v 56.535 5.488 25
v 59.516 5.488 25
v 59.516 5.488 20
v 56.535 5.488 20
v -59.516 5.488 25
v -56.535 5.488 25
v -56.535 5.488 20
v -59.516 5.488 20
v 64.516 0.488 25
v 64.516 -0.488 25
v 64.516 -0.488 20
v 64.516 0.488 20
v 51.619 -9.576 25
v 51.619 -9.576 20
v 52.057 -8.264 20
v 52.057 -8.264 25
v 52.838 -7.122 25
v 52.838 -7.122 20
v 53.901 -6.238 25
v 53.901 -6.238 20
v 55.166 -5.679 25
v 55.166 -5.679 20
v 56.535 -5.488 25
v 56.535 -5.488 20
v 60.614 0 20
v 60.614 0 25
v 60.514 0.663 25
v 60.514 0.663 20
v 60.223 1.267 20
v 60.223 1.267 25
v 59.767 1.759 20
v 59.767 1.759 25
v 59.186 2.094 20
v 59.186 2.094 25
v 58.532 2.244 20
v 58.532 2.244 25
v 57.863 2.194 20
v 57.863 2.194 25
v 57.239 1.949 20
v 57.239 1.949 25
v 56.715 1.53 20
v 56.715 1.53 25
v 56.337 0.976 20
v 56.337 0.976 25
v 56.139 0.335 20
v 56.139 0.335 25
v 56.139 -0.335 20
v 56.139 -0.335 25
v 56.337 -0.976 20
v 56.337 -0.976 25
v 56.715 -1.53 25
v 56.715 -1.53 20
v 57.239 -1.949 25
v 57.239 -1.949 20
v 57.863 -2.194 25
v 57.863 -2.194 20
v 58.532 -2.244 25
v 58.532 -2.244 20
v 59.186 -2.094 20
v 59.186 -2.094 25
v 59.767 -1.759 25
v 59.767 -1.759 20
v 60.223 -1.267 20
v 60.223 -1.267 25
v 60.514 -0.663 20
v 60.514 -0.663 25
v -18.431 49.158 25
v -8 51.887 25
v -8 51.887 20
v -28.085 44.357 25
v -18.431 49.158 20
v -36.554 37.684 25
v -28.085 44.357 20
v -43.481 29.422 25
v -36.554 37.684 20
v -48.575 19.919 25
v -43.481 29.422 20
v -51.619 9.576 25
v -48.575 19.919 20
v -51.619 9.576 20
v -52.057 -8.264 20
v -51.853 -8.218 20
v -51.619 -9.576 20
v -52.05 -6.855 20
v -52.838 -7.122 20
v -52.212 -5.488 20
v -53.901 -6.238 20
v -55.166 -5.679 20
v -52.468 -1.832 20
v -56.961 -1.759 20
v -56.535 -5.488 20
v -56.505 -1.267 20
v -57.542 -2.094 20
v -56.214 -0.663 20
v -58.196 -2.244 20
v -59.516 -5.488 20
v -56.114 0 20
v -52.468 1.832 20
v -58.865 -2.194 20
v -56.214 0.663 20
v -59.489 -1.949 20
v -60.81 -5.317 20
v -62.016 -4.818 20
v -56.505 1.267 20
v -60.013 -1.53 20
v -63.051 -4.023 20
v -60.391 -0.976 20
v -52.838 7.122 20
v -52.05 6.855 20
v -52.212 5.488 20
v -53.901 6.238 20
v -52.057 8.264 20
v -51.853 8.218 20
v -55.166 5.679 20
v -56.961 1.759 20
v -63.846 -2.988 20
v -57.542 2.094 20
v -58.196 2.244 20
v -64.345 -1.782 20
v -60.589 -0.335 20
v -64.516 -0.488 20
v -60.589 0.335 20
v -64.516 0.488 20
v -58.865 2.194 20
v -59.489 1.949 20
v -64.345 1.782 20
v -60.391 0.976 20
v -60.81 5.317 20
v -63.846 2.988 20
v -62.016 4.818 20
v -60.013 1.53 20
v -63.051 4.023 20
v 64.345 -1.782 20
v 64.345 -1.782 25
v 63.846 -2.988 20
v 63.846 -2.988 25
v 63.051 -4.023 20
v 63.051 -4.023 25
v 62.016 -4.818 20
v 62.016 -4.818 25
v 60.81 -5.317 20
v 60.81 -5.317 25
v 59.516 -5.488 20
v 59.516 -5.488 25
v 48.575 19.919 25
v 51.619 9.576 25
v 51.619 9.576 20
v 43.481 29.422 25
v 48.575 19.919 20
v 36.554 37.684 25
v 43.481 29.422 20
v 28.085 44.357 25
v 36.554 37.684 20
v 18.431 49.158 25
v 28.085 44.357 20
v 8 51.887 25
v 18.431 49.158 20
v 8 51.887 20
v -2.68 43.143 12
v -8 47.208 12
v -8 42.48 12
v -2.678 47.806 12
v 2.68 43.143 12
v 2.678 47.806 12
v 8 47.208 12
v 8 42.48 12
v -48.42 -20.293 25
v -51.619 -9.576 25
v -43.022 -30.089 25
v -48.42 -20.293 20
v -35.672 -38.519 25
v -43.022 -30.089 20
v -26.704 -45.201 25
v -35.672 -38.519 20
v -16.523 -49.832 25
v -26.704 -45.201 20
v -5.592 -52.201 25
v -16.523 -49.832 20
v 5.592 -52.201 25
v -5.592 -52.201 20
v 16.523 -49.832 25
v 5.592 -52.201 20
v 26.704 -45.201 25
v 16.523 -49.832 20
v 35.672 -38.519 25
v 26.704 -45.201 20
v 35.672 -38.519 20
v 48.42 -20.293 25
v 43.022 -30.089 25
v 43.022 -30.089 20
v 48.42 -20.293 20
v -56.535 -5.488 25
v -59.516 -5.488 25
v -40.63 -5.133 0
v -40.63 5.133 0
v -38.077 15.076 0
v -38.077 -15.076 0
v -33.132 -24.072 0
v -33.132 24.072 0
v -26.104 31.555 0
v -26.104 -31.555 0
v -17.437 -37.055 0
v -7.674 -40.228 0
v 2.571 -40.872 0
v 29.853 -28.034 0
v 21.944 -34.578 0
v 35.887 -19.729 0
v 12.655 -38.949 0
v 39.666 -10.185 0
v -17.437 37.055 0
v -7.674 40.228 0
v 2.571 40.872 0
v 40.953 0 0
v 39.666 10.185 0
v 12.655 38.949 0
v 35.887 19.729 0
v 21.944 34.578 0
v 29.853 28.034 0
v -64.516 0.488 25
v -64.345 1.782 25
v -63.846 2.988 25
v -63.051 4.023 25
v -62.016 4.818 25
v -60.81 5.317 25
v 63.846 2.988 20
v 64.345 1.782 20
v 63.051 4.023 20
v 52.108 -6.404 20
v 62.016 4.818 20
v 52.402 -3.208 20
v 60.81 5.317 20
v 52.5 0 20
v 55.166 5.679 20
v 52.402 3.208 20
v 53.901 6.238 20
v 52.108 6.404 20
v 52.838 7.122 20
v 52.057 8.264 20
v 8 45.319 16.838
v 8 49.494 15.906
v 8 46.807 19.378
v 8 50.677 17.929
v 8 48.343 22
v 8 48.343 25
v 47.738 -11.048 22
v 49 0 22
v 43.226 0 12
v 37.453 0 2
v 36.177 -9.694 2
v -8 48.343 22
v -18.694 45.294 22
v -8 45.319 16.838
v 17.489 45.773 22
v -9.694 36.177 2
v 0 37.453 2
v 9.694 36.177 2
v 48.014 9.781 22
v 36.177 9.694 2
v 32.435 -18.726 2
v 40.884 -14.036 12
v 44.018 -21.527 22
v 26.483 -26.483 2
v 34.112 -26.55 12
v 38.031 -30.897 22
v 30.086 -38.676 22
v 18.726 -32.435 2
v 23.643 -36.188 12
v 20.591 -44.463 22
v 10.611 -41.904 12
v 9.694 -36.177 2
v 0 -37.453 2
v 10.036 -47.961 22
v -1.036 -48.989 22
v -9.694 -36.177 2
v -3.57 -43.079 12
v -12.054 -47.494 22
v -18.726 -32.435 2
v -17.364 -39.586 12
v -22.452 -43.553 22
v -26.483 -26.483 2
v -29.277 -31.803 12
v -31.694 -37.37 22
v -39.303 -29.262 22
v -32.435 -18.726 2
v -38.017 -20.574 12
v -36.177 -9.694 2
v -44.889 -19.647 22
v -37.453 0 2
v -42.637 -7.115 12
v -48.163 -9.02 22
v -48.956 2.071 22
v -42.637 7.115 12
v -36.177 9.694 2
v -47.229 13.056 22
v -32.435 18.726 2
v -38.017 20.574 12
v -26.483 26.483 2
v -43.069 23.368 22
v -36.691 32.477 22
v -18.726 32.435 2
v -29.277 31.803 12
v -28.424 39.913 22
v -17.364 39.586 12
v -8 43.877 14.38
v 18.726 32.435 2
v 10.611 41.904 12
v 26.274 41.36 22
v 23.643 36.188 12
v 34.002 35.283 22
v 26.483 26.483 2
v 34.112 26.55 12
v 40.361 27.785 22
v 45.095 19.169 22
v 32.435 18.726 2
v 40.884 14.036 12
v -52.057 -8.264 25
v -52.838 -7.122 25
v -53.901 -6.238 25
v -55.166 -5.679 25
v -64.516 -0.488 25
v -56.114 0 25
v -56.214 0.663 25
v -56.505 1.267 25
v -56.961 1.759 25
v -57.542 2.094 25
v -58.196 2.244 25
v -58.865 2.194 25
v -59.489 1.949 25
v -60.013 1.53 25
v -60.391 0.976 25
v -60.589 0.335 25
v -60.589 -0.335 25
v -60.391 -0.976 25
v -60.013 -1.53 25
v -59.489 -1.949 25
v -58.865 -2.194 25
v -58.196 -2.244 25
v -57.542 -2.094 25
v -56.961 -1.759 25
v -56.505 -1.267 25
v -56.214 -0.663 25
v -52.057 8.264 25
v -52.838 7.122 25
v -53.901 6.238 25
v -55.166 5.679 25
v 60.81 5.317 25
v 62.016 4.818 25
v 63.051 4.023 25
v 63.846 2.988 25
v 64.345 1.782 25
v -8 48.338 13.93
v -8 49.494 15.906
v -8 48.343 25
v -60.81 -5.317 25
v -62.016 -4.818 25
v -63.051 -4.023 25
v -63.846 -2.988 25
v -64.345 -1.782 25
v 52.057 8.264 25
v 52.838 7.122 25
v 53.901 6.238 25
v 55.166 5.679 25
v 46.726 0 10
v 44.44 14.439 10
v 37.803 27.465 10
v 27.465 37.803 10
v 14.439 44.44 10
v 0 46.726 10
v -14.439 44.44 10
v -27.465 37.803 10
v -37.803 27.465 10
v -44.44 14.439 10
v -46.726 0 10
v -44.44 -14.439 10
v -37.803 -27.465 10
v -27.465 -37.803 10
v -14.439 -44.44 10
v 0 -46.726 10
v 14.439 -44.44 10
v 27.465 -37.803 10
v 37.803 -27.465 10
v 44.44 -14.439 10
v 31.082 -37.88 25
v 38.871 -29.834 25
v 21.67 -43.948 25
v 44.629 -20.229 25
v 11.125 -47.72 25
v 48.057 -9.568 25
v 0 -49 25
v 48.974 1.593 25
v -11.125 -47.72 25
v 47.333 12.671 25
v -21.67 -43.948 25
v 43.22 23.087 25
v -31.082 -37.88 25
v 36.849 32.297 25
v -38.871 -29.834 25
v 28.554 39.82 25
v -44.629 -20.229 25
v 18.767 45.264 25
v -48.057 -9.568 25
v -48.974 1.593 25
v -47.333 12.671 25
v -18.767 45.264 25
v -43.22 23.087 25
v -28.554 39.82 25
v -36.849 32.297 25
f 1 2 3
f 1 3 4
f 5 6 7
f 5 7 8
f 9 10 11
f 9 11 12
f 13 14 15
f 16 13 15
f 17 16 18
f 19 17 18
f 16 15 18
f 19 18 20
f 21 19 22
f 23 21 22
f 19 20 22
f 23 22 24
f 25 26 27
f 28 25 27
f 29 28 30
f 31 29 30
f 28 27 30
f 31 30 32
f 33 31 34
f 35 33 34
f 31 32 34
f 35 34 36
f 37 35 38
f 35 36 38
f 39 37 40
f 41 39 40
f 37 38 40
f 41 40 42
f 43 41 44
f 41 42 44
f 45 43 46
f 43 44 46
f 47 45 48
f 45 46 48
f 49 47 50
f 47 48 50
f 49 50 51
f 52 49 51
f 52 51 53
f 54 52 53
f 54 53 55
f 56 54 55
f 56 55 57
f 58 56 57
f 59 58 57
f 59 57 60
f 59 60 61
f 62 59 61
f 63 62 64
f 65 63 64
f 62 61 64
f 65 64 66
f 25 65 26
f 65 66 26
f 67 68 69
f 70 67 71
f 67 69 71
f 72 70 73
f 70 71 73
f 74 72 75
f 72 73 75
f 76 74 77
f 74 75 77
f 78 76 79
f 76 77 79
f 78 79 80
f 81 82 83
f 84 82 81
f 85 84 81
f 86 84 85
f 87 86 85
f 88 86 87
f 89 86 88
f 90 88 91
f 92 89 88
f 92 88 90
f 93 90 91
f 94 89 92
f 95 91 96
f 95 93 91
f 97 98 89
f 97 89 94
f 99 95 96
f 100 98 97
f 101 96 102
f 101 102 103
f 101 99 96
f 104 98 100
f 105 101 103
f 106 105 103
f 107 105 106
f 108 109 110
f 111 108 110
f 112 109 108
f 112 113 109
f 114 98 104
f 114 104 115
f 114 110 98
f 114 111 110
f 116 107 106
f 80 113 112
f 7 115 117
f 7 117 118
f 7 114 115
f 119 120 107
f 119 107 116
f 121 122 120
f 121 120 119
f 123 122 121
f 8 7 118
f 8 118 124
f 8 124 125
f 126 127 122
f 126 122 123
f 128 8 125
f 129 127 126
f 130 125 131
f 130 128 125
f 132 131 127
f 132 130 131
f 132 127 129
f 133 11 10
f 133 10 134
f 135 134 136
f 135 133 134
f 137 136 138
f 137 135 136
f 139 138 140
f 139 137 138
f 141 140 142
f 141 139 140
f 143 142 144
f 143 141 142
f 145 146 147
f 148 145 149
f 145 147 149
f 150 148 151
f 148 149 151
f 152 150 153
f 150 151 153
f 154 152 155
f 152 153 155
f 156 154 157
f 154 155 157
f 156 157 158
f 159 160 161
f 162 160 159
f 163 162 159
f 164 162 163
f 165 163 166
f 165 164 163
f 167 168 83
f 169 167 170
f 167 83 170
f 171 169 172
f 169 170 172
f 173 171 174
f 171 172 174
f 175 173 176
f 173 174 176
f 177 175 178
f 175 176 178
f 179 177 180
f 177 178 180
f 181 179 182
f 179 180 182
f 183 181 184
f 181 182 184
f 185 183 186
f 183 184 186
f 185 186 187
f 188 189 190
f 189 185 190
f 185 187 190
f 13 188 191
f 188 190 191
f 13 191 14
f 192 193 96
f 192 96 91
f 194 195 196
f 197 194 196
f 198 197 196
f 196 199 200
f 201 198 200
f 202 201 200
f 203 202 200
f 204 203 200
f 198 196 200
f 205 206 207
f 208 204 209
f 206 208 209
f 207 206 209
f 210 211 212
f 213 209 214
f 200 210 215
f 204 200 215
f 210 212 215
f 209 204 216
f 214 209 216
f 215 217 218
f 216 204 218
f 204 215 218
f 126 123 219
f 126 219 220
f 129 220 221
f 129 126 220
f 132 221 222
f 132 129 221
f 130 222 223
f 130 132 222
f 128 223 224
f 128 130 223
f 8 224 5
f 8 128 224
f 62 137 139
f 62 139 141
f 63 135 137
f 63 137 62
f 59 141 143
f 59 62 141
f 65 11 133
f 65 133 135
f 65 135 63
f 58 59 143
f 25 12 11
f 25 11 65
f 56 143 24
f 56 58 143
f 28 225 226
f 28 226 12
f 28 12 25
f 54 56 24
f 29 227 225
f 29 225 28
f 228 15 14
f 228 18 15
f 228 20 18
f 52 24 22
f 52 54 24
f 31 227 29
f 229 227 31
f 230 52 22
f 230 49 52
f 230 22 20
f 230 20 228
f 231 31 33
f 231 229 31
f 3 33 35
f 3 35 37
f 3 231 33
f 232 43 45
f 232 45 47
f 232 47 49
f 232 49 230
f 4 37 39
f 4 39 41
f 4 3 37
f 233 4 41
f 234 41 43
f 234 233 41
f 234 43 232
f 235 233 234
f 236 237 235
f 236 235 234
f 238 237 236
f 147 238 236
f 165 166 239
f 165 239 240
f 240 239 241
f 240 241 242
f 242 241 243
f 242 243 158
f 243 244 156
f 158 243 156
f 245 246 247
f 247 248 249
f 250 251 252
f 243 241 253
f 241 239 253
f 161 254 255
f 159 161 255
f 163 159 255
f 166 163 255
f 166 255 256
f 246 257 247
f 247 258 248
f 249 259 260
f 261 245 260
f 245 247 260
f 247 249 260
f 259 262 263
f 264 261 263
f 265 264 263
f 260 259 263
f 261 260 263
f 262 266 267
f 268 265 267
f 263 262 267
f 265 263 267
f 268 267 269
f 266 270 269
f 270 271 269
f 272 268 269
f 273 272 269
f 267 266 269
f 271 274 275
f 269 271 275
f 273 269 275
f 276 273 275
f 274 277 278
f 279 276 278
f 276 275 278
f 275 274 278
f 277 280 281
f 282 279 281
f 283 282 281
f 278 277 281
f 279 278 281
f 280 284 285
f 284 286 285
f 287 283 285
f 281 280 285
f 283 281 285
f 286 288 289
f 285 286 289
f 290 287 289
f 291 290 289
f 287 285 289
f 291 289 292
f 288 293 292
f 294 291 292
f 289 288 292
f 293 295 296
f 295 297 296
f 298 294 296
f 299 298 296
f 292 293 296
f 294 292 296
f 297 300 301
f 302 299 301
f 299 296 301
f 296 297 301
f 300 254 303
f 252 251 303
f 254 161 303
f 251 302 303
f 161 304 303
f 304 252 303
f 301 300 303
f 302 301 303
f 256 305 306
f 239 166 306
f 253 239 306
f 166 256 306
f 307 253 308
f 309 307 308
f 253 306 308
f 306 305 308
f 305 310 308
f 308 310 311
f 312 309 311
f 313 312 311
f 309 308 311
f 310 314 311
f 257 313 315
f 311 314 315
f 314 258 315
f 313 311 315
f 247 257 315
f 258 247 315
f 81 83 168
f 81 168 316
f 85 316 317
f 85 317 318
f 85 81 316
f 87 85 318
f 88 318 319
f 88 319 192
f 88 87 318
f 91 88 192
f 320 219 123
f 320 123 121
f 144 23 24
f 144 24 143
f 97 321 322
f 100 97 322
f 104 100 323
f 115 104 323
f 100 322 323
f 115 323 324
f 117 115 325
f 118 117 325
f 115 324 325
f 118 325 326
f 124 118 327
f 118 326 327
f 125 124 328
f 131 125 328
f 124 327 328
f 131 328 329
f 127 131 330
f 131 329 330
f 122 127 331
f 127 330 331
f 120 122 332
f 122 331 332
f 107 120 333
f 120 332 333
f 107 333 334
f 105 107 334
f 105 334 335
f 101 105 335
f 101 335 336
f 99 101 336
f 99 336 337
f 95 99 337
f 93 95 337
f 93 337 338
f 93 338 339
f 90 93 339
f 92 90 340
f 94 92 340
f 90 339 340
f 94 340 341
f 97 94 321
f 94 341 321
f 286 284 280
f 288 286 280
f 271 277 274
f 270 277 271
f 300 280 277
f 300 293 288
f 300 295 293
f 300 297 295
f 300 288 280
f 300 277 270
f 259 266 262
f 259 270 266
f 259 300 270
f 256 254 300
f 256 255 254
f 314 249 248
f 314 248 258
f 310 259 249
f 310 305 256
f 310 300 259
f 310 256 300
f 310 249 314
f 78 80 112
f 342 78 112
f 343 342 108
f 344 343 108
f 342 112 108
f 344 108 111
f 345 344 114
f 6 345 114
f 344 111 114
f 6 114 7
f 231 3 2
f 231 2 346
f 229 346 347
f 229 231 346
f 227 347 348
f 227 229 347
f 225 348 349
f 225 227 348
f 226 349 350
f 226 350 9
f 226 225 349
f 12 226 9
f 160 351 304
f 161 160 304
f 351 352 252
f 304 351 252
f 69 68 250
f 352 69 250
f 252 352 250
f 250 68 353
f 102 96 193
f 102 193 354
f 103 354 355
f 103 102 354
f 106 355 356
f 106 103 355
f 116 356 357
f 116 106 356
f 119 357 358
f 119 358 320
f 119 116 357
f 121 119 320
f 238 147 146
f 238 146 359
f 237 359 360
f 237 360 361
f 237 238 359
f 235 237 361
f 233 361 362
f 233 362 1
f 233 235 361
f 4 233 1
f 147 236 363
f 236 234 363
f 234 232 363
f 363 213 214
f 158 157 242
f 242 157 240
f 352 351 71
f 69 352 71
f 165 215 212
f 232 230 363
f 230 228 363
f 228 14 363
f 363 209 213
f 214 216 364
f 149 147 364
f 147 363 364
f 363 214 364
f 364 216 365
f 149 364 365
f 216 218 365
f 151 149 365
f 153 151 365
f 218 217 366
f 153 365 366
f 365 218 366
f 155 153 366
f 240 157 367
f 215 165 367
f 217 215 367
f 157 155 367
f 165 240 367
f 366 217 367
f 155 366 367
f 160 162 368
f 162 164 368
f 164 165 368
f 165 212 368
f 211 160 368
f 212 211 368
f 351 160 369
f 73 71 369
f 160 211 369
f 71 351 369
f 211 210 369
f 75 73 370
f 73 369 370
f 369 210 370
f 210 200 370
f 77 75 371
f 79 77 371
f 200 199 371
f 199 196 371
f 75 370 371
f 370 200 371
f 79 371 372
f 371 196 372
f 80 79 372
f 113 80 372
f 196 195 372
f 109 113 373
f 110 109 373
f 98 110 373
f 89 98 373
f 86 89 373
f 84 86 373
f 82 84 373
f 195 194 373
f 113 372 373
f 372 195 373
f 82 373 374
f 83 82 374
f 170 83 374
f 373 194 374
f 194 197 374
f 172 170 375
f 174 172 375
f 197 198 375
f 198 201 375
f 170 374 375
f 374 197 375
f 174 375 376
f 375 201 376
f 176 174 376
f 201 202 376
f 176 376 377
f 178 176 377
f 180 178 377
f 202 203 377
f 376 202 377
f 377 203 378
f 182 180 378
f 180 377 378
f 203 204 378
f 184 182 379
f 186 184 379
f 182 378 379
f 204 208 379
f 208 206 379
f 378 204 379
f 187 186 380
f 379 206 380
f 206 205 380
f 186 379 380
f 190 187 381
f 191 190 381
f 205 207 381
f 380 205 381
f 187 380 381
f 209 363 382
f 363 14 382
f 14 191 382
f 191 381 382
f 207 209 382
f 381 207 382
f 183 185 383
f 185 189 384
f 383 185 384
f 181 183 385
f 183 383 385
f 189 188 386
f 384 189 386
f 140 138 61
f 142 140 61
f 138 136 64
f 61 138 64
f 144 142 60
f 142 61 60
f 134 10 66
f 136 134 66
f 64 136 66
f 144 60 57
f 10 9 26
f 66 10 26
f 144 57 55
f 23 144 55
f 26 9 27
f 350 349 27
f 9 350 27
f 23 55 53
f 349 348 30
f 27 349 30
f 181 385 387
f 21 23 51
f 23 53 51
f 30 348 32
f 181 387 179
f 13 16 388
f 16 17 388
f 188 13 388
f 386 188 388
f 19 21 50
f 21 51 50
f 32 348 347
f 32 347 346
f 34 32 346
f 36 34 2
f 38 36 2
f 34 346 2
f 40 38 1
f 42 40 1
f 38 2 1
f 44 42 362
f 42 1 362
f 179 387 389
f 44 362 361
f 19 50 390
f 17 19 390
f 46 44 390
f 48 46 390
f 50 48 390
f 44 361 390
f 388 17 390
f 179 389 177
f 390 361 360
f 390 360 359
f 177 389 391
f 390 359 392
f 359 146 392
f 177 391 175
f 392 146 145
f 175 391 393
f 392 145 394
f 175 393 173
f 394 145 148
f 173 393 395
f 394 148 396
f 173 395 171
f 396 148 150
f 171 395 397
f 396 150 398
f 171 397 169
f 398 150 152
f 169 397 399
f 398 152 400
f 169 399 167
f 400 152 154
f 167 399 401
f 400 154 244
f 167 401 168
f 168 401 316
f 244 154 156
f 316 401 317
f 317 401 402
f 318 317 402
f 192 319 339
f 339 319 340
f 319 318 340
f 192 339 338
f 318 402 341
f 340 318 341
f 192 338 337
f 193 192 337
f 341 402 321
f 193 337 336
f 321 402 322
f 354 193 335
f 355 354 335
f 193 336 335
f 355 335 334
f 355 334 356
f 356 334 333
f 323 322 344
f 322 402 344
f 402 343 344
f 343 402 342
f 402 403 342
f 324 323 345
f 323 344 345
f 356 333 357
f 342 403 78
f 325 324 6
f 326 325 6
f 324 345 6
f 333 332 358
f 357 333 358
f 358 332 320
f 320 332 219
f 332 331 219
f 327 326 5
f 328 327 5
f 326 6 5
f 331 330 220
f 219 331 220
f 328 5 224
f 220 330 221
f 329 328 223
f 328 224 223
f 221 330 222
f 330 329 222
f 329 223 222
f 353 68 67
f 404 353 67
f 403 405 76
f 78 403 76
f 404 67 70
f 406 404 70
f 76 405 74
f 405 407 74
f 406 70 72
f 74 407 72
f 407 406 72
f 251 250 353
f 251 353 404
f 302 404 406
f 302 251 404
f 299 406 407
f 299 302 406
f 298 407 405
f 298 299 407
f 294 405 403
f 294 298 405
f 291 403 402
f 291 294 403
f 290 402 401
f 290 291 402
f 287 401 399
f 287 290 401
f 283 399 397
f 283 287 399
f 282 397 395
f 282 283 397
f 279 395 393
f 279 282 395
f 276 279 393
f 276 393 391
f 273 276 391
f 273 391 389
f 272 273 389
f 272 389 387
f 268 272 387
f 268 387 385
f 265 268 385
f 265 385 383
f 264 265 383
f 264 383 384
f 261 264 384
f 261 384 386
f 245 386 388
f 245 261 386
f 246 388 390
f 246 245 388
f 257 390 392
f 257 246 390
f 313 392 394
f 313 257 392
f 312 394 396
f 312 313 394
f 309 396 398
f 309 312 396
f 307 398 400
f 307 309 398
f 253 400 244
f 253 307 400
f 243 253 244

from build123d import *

# Parameters (mm, degrees)
F0_R        = 52.5
F0_R_2      = 49
F1_DEPTH    = 2
F2_DEPTH    = 25
F3_SIZE2    = 11.5470053838
F3_SIZE     = 20
F4_SIZE2    = 11.5470053838
F4_SIZE     = 20
F6_DEPTH    = 13
F7_R        = 2.25
F8_DEPTH    = 5
F9_T1_DEPTH = 5
F9_T3_DEPTH = 5


# Not quite as in the source:
# - a fillet or chamfer that OpenCascade refuses, or shapes differently, is made with other operations: its cross-section is extruded or revolved along the edge and cut away or added


with BuildPart() as f1:
    # F0 (on Top) → F1 (new body)
    with BuildSketch(Plane.XY):
        Circle(F0_R)
        Circle(F0_R_2, mode=Mode.SUBTRACT)
        Circle(F0_R_2)
    extrude(amount=F1_DEPTH)

    # F0 (on Top) → F2 (join)
    with BuildSketch(Plane.XY):
        Circle(F0_R)
        Circle(F0_R_2, mode=Mode.SUBTRACT)
    extrude(amount=F2_DEPTH)

    # F3
    f3_edges = [f1.edges().sort_by_distance(p)[0] for p in [
        (-49, 0, 2),
    ]]
    chamfer(f3_edges, length=F3_SIZE, length2=F3_SIZE2)

    # F4
    f4_edges = [f1.edges().sort_by_distance(p)[0] for p in [
        (-52.5, 0, 0),
    ]]
    f4_side = f1.faces().sort_by_distance((-52.5, 0, 12.5))[0]
    chamfer(f4_edges, length=F4_SIZE, length2=F4_SIZE2, reference=f4_side)

    # F5 (on face) → F6 (cut)
    with BuildSketch(Plane.XY.offset(25)):
        with BuildLine():
            Line((8, 51.8868962263), (8, 67.5))
            Line((8, 67.5), (-8, 67.5))
            Line((-8, 67.5), (-8, 51.8868962263))
            ThreePointArc((-8, 51.8868962263), (0, 52.5), (8, 51.8868962263))
        make_face()
        with BuildLine():
            Line((8, 48.3425278611), (8, 51.8868962263))
            ThreePointArc((8, 51.8868962263), (0, 52.5), (-8, 51.8868962263))
            Line((-8, 51.8868962263), (-8, 48.3425278611))
            ThreePointArc((-8, 48.3425278611), (0, 49), (8, 48.3425278611))
        make_face()
        with BuildLine():
            Line((8, 37.5), (8, 48.3425278611))
            ThreePointArc((8, 48.3425278611), (0, 49), (-8, 48.3425278611))
            Line((-8, 48.3425278611), (-8, 37.5))
            Line((-8, 37.5), (8, 37.5))
        make_face()
    extrude(amount=-F6_DEPTH, mode=Mode.SUBTRACT)

    # F7 (on face) → F8 (join)
    with BuildSketch(Plane.XY.offset(25)):
        with BuildLine():
            Line((-64.5158270159, -5.4877443216), (-52.2123995068, -5.4877443216))
            ThreePointArc((-52.2123995068, -5.4877443216), (-52.5, 0), (-52.2123995068, 5.4877443216))
            Line((-52.2123995068, 5.4877443216), (-64.5158270159, 5.4877443216))
            Line((-64.5158270159, 5.4877443216), (-64.5158270159, -5.4877443216))
        make_face()
        with Locations((-58.3641132614, 0)):
            Circle(F7_R, mode=Mode.SUBTRACT)
        with BuildLine():
            ThreePointArc((52.2123995068, 5.4877443216), (52.5, 0), (52.2123995068, -5.4877443216))
            Line((52.2123995068, -5.4877443216), (64.5158270159, -5.4877443216))
            Line((64.5158270159, -5.4877443216), (64.5158270159, 5.4877443216))
            Line((64.5158270159, 5.4877443216), (52.2123995068, 5.4877443216))
        make_face()
        with Locations((58.3641132614, 0)):
            Circle(F7_R, mode=Mode.SUBTRACT)
    extrude(amount=-F8_DEPTH)

    # F9: fillet of radius 5 on 8 edges, made by hand

    # F9_s2 → F9_t1 (join)
    with BuildSketch(Plane.XY.offset(20)):
        with BuildLine():
            ThreePointArc((-51.6193248202, -9.5757665545), (-53.3385688277, -6.6432749931), (-56.5354509936, -5.4877443216))
            Line((-56.5354509936, -5.4877443216), (-56.5354509936, -5.3877443216))
            Line((-56.5354509936, -5.3877443216), (-52.2123995068, -5.3877443216))
            Line((-52.2123995068, -5.3877443216), (-52.1129473173, -5.4772914752))
            ThreePointArc((-52.1129473173, -5.4772914752), (-51.8571206165, -7.5232334382), (-51.5210022967, -9.5575269991))
            Line((-51.5210022967, -9.5575269991), (-51.6193248202, -9.5757665545))
        make_face()
        with BuildLine():
            ThreePointArc((-51.6193248202, 9.5757665545), (-53.3385688277, 6.6432749931), (-56.5354509936, 5.4877443216))
            Line((-56.5354509936, 5.4877443216), (-56.5354509936, 5.3877443216))
            Line((-56.5354509936, 5.3877443216), (-52.2123995068, 5.3877443216))
            Line((-52.2123995068, 5.3877443216), (-52.1129473173, 5.4772914752))
            ThreePointArc((-52.1129473173, 5.4772914752), (-51.8571206165, 7.5232334382), (-51.5210022967, 9.5575269991))
            Line((-51.5210022967, 9.5575269991), (-51.6193248202, 9.5757665545))
        make_face()
        with BuildLine():
            ThreePointArc((51.6193248202, -9.5757665545), (53.3385688277, -6.6432749931), (56.5354509936, -5.4877443216))
            Line((56.5354509936, -5.4877443216), (56.5354509936, -5.3877443216))
            Line((56.5354509936, -5.3877443216), (52.2123995068, -5.3877443216))
            Line((52.2123995068, -5.3877443216), (52.1129473173, -5.4772914752))
            ThreePointArc((52.1129473173, -5.4772914752), (51.8571206165, -7.5232334382), (51.5210022967, -9.5575269991))
            Line((51.5210022967, -9.5575269991), (51.6193248202, -9.5757665545))
        make_face()
        with BuildLine():
            ThreePointArc((51.6193248202, 9.5757665545), (53.3385688277, 6.6432749931), (56.5354509936, 5.4877443216))
            Line((56.5354509936, 5.4877443216), (56.5354509936, 5.3877443216))
            Line((56.5354509936, 5.3877443216), (52.2123995068, 5.3877443216))
            Line((52.2123995068, 5.3877443216), (52.1129473173, 5.4772914752))
            ThreePointArc((52.1129473173, 5.4772914752), (51.8571206165, 7.5232334382), (51.5210022967, 9.5575269991))
            Line((51.5210022967, 9.5575269991), (51.6193248202, 9.5757665545))
        make_face()
    extrude(amount=F9_T1_DEPTH)

    # F9_s4 → F9_t3 (cut)
    with BuildSketch(Plane.XY.offset(20)):
        with BuildLine():
            ThreePointArc((-59.5158270159, -5.4877443216), (-63.0513609218, -4.0232782275), (-64.5158270159, -0.4877443216))
            Line((-64.5158270159, -0.4877443216), (-64.6158270159, -0.4877443216))
            Line((-64.6158270159, -0.4877443216), (-64.6158270159, -5.5877443216))
            Line((-64.6158270159, -5.5877443216), (-59.5158270159, -5.5877443216))
            Line((-59.5158270159, -5.5877443216), (-59.5158270159, -5.4877443216))
        make_face()
        with BuildLine():
            ThreePointArc((-64.5158270159, 0.4877443216), (-63.0513609218, 4.0232782275), (-59.5158270159, 5.4877443216))
            Line((-59.5158270159, 5.4877443216), (-59.5158270159, 5.5877443216))
            Line((-59.5158270159, 5.5877443216), (-64.6158270159, 5.5877443216))
            Line((-64.6158270159, 5.5877443216), (-64.6158270159, 0.4877443216))
            Line((-64.6158270159, 0.4877443216), (-64.5158270159, 0.4877443216))
        make_face()
        with BuildLine():
            ThreePointArc((64.5158270159, -0.4877443216), (63.0513609218, -4.0232782275), (59.5158270159, -5.4877443216))
            Line((59.5158270159, -5.4877443216), (59.5158270159, -5.5877443216))
            Line((59.5158270159, -5.5877443216), (64.6158270159, -5.5877443216))
            Line((64.6158270159, -5.5877443216), (64.6158270159, -0.4877443216))
            Line((64.6158270159, -0.4877443216), (64.5158270159, -0.4877443216))
        make_face()
        with BuildLine():
            ThreePointArc((59.5158270159, 5.4877443216), (63.0513609218, 4.0232782275), (64.5158270159, 0.4877443216))
            Line((64.5158270159, 0.4877443216), (64.6158270159, 0.4877443216))
            Line((64.6158270159, 0.4877443216), (64.6158270159, 5.5877443216))
            Line((64.6158270159, 5.5877443216), (59.5158270159, 5.5877443216))
            Line((59.5158270159, 5.5877443216), (59.5158270159, 5.4877443216))
        make_face()
    extrude(amount=F9_T3_DEPTH, mode=Mode.SUBTRACT)


solid = f1.part
